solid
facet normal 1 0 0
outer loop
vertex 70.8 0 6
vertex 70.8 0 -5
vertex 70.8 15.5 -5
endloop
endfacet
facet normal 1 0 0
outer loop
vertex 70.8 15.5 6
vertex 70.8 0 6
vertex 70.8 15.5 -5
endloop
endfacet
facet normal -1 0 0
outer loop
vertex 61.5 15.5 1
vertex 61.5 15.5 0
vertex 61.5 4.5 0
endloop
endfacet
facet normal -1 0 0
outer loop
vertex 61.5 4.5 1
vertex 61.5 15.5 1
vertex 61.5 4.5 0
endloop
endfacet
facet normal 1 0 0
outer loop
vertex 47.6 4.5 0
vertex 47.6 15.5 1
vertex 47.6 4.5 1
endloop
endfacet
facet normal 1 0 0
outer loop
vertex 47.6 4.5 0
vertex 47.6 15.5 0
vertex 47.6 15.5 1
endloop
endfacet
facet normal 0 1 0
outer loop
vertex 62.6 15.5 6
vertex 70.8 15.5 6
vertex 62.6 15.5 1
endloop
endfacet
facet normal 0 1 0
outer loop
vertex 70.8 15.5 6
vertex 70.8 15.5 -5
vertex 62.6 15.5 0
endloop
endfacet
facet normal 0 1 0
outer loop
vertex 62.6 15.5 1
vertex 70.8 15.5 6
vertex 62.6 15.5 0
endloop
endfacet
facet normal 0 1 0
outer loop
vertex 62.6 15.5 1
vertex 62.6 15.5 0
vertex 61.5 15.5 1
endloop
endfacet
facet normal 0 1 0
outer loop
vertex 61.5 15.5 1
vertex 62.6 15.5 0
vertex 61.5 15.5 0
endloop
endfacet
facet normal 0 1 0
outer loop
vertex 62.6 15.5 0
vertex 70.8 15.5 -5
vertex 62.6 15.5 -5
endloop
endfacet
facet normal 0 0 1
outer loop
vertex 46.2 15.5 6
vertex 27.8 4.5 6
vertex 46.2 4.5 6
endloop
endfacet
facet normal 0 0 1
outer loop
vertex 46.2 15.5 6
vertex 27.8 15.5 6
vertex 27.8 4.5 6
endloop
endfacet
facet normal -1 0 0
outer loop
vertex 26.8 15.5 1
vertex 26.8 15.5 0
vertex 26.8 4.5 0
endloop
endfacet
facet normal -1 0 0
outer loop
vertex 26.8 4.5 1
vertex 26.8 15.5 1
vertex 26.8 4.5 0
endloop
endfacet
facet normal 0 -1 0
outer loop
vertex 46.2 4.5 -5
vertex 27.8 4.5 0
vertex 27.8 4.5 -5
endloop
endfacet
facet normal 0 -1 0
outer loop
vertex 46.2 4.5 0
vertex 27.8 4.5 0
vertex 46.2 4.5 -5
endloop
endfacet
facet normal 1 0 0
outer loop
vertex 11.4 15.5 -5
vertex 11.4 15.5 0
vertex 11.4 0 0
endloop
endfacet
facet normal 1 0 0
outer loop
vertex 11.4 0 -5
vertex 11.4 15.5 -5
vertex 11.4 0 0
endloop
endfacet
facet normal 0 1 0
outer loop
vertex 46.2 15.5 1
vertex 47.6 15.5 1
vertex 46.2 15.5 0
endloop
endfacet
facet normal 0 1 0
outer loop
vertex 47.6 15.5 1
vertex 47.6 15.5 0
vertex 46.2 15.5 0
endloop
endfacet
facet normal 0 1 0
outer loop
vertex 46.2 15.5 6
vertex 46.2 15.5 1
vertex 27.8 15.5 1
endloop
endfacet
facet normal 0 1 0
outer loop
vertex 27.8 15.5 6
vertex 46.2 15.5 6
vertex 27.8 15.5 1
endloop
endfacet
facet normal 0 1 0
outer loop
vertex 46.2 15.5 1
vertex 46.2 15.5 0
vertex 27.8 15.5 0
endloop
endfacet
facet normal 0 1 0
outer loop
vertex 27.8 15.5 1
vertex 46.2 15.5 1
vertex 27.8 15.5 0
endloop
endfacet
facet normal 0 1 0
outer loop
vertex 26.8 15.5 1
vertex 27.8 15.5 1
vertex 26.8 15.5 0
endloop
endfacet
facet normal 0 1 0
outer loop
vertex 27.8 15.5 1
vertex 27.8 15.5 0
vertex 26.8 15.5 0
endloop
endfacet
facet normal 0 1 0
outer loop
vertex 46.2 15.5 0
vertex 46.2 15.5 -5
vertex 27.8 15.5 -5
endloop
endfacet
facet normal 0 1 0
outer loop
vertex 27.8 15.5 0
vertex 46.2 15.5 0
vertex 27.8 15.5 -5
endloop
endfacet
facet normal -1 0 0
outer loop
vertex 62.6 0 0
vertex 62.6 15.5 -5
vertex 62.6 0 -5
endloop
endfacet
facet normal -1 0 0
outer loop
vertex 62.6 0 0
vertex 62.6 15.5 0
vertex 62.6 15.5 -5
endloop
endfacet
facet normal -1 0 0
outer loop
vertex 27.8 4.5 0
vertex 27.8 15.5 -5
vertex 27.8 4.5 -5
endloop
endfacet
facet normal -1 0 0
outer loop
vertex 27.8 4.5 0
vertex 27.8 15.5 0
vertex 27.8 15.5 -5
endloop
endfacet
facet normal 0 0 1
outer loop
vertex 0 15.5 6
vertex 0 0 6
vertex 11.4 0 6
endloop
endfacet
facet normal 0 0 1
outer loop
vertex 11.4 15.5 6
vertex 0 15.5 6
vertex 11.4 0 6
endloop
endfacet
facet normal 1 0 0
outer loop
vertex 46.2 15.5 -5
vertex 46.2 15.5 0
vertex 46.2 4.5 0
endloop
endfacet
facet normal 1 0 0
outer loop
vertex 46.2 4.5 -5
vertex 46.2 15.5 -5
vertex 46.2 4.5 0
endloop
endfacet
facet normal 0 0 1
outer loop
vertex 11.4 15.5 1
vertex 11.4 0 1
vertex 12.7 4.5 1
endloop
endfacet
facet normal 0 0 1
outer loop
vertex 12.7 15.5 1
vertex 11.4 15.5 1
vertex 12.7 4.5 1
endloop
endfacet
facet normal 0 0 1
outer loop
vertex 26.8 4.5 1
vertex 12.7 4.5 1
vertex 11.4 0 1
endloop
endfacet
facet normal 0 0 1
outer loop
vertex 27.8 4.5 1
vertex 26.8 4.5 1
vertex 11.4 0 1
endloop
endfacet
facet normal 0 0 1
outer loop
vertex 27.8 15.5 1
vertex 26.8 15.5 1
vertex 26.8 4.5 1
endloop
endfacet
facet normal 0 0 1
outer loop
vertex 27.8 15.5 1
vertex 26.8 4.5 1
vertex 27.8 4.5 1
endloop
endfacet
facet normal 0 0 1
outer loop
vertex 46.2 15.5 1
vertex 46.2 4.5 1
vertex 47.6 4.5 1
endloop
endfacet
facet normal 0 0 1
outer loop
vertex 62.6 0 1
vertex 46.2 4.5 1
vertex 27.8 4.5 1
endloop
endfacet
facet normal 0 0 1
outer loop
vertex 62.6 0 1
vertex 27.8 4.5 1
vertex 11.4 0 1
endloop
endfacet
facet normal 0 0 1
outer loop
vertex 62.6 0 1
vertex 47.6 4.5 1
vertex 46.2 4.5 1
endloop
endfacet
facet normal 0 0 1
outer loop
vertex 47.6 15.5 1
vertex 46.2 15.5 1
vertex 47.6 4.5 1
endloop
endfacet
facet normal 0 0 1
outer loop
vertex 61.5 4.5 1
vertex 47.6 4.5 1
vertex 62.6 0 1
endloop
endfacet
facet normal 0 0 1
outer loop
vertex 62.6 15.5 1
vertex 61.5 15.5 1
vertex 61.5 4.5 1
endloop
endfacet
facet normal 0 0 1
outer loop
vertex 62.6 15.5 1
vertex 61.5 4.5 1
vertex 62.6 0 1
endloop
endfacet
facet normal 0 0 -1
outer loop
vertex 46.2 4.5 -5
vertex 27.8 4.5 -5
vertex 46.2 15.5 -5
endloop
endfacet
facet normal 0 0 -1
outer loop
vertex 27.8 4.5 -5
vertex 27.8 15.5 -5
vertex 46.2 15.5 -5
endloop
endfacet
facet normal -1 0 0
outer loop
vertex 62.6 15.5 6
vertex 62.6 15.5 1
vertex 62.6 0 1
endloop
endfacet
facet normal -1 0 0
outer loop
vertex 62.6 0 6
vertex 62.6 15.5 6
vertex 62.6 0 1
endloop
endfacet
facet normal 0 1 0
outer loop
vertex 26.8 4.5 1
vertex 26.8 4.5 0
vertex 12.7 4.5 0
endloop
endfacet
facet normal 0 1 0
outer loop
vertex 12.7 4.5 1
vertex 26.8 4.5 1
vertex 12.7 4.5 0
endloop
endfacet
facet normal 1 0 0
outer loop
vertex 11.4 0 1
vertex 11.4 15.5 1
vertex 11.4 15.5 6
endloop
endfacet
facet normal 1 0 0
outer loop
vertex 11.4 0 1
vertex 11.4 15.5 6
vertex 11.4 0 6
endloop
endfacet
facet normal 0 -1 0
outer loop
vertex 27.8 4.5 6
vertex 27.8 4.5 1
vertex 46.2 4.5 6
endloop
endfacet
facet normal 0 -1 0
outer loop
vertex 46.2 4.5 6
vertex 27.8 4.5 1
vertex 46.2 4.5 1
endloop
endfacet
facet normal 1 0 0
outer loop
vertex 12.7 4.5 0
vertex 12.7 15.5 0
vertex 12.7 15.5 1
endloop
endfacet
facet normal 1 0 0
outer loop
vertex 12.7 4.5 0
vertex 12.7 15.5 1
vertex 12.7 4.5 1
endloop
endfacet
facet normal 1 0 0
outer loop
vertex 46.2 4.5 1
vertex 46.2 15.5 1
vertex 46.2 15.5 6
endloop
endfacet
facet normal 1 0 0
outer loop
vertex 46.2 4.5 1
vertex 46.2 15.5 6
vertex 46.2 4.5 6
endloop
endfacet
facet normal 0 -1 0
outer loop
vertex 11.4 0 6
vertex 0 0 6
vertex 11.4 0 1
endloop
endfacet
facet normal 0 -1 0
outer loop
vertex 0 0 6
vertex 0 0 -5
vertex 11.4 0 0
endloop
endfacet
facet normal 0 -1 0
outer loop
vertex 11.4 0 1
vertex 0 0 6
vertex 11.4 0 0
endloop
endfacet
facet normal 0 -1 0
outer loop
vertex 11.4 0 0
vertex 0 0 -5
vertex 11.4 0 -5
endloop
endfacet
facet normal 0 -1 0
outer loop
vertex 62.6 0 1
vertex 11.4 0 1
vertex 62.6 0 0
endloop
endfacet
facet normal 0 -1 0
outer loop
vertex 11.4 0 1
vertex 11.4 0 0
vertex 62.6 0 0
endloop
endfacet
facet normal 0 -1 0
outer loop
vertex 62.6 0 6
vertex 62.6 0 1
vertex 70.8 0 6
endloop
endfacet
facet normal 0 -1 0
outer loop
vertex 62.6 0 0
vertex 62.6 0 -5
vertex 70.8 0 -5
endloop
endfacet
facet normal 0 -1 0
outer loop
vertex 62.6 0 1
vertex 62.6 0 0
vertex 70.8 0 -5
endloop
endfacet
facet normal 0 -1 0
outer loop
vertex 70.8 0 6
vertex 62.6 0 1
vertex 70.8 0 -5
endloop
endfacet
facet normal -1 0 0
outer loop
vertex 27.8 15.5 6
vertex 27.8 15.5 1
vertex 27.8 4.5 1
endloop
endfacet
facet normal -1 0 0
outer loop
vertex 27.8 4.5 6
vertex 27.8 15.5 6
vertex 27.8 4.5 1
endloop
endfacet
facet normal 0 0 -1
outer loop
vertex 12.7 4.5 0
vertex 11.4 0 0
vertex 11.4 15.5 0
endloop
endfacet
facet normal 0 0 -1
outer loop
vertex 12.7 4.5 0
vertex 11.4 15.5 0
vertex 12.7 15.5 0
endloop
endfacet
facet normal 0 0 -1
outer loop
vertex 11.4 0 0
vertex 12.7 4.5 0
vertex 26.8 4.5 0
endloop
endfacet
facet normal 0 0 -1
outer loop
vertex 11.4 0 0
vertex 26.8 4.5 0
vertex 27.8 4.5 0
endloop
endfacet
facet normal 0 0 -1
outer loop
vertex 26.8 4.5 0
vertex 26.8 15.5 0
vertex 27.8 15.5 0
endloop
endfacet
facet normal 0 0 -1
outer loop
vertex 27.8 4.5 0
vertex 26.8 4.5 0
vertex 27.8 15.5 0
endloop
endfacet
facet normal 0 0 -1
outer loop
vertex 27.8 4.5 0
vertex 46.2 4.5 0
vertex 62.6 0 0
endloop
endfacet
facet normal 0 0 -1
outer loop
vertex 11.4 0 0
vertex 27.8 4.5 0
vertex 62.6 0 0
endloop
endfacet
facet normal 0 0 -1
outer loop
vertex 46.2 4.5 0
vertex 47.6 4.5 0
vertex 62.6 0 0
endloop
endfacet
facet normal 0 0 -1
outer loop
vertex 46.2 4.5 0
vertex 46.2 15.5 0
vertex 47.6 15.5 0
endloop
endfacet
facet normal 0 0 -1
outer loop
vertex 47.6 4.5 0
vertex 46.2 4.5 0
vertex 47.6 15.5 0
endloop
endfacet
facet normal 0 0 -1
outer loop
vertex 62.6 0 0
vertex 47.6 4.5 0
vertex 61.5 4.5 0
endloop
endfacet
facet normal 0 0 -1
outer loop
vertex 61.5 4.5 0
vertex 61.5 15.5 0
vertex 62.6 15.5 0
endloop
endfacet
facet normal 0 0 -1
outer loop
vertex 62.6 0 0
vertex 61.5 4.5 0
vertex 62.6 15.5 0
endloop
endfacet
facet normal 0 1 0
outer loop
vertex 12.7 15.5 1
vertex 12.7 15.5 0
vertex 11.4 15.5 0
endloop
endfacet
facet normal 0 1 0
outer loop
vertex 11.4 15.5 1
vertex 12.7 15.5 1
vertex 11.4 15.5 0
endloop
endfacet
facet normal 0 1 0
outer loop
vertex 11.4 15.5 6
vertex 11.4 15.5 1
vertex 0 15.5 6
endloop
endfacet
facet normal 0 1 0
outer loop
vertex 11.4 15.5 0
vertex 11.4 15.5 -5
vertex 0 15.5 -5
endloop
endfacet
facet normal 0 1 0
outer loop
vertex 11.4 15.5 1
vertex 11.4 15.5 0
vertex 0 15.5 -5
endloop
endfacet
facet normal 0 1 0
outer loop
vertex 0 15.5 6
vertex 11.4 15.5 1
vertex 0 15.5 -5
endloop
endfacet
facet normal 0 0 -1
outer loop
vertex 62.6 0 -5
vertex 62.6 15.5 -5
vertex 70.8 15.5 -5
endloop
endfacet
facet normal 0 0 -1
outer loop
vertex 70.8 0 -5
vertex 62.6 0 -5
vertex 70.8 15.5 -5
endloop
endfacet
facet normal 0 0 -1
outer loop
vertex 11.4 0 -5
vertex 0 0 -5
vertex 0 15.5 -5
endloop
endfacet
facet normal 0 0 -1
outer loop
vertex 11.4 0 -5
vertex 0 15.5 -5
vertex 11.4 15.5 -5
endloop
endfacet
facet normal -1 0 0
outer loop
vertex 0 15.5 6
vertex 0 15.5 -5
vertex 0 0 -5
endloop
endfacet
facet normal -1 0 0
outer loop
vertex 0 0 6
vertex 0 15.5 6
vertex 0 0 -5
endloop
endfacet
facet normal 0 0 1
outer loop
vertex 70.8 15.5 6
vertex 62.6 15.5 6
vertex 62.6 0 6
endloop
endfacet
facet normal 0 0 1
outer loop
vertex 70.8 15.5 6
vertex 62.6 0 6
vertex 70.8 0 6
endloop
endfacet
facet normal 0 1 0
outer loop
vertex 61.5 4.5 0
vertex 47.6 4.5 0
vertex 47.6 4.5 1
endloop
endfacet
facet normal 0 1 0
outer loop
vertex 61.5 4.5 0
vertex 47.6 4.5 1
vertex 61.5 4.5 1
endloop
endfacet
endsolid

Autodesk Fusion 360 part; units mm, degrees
sketch "Sketch1" plane through (0, 0, 0) normal (0, 0, 1) x (1, 0, 0)
  line L0 (0, 0) -> (70.8, 0)
  line L1 (70.8, 0) -> (70.8, 15.5)
  line L2 (70.8, 15.5) -> (0, 15.5)
  line L3 (0, 15.5) -> (0, 0)
  line L4 (11.4, 15.5) -> (11.4, 0)
  line L5 (62.6, 15.5) -> (62.6, 0)
  line L6 (27.8, 15.5) -> (27.8, 4.5)
  line L7 (46.2, 15.5) -> (46.2, 4.5)
  line L8 (27.8, 4.5) -> (46.2, 4.5)
  line L9 (12.7, 15.5) -> (12.7, 4.5)
  line L10 (26.8, 15.5) -> (26.8, 4.5)
  line L11 (26.8, 4.5) -> (12.7, 4.5)
  line L12 (47.6, 15.5) -> (47.6, 4.5)
  line L13 (61.5, 15.5) -> (61.5, 4.5)
  line L14 (47.6, 4.5) -> (61.5, 4.5)
  dimension "d1" = 15.5
  dimension "d2" = 70.8
  dimension "d3" = 11.4
  dimension "d4" = 8.2
  dimension "d5" = 43
  dimension "d6" = 46.2
  dimension "d7" = 11
  dimension "d12" = 23.2
  dimension "d13" = 61.5
  dimension "d14" = 26.8
  dimension "d15" = 58.1
extrude "Extrude1" add sketch "Sketch1" along normal blind 1
extrude "Extrude2" add sketch "Sketch1" along normal blind 6 contours L0 L2 L3 L4 | L0 L1 L2 L5 | L2 L6 L7 L8
extrude "Extrude3" cut sketch "Sketch1" along normal blind 1 contours L2 L9 L10 L11 | L2 L12 L13 L14
extrude "Extrude4" add sketch "Sketch1" against normal blind 5 contours L0 L2 L3 L4 | L0 L1 L2 L5 | L2 L6 L7 L8
